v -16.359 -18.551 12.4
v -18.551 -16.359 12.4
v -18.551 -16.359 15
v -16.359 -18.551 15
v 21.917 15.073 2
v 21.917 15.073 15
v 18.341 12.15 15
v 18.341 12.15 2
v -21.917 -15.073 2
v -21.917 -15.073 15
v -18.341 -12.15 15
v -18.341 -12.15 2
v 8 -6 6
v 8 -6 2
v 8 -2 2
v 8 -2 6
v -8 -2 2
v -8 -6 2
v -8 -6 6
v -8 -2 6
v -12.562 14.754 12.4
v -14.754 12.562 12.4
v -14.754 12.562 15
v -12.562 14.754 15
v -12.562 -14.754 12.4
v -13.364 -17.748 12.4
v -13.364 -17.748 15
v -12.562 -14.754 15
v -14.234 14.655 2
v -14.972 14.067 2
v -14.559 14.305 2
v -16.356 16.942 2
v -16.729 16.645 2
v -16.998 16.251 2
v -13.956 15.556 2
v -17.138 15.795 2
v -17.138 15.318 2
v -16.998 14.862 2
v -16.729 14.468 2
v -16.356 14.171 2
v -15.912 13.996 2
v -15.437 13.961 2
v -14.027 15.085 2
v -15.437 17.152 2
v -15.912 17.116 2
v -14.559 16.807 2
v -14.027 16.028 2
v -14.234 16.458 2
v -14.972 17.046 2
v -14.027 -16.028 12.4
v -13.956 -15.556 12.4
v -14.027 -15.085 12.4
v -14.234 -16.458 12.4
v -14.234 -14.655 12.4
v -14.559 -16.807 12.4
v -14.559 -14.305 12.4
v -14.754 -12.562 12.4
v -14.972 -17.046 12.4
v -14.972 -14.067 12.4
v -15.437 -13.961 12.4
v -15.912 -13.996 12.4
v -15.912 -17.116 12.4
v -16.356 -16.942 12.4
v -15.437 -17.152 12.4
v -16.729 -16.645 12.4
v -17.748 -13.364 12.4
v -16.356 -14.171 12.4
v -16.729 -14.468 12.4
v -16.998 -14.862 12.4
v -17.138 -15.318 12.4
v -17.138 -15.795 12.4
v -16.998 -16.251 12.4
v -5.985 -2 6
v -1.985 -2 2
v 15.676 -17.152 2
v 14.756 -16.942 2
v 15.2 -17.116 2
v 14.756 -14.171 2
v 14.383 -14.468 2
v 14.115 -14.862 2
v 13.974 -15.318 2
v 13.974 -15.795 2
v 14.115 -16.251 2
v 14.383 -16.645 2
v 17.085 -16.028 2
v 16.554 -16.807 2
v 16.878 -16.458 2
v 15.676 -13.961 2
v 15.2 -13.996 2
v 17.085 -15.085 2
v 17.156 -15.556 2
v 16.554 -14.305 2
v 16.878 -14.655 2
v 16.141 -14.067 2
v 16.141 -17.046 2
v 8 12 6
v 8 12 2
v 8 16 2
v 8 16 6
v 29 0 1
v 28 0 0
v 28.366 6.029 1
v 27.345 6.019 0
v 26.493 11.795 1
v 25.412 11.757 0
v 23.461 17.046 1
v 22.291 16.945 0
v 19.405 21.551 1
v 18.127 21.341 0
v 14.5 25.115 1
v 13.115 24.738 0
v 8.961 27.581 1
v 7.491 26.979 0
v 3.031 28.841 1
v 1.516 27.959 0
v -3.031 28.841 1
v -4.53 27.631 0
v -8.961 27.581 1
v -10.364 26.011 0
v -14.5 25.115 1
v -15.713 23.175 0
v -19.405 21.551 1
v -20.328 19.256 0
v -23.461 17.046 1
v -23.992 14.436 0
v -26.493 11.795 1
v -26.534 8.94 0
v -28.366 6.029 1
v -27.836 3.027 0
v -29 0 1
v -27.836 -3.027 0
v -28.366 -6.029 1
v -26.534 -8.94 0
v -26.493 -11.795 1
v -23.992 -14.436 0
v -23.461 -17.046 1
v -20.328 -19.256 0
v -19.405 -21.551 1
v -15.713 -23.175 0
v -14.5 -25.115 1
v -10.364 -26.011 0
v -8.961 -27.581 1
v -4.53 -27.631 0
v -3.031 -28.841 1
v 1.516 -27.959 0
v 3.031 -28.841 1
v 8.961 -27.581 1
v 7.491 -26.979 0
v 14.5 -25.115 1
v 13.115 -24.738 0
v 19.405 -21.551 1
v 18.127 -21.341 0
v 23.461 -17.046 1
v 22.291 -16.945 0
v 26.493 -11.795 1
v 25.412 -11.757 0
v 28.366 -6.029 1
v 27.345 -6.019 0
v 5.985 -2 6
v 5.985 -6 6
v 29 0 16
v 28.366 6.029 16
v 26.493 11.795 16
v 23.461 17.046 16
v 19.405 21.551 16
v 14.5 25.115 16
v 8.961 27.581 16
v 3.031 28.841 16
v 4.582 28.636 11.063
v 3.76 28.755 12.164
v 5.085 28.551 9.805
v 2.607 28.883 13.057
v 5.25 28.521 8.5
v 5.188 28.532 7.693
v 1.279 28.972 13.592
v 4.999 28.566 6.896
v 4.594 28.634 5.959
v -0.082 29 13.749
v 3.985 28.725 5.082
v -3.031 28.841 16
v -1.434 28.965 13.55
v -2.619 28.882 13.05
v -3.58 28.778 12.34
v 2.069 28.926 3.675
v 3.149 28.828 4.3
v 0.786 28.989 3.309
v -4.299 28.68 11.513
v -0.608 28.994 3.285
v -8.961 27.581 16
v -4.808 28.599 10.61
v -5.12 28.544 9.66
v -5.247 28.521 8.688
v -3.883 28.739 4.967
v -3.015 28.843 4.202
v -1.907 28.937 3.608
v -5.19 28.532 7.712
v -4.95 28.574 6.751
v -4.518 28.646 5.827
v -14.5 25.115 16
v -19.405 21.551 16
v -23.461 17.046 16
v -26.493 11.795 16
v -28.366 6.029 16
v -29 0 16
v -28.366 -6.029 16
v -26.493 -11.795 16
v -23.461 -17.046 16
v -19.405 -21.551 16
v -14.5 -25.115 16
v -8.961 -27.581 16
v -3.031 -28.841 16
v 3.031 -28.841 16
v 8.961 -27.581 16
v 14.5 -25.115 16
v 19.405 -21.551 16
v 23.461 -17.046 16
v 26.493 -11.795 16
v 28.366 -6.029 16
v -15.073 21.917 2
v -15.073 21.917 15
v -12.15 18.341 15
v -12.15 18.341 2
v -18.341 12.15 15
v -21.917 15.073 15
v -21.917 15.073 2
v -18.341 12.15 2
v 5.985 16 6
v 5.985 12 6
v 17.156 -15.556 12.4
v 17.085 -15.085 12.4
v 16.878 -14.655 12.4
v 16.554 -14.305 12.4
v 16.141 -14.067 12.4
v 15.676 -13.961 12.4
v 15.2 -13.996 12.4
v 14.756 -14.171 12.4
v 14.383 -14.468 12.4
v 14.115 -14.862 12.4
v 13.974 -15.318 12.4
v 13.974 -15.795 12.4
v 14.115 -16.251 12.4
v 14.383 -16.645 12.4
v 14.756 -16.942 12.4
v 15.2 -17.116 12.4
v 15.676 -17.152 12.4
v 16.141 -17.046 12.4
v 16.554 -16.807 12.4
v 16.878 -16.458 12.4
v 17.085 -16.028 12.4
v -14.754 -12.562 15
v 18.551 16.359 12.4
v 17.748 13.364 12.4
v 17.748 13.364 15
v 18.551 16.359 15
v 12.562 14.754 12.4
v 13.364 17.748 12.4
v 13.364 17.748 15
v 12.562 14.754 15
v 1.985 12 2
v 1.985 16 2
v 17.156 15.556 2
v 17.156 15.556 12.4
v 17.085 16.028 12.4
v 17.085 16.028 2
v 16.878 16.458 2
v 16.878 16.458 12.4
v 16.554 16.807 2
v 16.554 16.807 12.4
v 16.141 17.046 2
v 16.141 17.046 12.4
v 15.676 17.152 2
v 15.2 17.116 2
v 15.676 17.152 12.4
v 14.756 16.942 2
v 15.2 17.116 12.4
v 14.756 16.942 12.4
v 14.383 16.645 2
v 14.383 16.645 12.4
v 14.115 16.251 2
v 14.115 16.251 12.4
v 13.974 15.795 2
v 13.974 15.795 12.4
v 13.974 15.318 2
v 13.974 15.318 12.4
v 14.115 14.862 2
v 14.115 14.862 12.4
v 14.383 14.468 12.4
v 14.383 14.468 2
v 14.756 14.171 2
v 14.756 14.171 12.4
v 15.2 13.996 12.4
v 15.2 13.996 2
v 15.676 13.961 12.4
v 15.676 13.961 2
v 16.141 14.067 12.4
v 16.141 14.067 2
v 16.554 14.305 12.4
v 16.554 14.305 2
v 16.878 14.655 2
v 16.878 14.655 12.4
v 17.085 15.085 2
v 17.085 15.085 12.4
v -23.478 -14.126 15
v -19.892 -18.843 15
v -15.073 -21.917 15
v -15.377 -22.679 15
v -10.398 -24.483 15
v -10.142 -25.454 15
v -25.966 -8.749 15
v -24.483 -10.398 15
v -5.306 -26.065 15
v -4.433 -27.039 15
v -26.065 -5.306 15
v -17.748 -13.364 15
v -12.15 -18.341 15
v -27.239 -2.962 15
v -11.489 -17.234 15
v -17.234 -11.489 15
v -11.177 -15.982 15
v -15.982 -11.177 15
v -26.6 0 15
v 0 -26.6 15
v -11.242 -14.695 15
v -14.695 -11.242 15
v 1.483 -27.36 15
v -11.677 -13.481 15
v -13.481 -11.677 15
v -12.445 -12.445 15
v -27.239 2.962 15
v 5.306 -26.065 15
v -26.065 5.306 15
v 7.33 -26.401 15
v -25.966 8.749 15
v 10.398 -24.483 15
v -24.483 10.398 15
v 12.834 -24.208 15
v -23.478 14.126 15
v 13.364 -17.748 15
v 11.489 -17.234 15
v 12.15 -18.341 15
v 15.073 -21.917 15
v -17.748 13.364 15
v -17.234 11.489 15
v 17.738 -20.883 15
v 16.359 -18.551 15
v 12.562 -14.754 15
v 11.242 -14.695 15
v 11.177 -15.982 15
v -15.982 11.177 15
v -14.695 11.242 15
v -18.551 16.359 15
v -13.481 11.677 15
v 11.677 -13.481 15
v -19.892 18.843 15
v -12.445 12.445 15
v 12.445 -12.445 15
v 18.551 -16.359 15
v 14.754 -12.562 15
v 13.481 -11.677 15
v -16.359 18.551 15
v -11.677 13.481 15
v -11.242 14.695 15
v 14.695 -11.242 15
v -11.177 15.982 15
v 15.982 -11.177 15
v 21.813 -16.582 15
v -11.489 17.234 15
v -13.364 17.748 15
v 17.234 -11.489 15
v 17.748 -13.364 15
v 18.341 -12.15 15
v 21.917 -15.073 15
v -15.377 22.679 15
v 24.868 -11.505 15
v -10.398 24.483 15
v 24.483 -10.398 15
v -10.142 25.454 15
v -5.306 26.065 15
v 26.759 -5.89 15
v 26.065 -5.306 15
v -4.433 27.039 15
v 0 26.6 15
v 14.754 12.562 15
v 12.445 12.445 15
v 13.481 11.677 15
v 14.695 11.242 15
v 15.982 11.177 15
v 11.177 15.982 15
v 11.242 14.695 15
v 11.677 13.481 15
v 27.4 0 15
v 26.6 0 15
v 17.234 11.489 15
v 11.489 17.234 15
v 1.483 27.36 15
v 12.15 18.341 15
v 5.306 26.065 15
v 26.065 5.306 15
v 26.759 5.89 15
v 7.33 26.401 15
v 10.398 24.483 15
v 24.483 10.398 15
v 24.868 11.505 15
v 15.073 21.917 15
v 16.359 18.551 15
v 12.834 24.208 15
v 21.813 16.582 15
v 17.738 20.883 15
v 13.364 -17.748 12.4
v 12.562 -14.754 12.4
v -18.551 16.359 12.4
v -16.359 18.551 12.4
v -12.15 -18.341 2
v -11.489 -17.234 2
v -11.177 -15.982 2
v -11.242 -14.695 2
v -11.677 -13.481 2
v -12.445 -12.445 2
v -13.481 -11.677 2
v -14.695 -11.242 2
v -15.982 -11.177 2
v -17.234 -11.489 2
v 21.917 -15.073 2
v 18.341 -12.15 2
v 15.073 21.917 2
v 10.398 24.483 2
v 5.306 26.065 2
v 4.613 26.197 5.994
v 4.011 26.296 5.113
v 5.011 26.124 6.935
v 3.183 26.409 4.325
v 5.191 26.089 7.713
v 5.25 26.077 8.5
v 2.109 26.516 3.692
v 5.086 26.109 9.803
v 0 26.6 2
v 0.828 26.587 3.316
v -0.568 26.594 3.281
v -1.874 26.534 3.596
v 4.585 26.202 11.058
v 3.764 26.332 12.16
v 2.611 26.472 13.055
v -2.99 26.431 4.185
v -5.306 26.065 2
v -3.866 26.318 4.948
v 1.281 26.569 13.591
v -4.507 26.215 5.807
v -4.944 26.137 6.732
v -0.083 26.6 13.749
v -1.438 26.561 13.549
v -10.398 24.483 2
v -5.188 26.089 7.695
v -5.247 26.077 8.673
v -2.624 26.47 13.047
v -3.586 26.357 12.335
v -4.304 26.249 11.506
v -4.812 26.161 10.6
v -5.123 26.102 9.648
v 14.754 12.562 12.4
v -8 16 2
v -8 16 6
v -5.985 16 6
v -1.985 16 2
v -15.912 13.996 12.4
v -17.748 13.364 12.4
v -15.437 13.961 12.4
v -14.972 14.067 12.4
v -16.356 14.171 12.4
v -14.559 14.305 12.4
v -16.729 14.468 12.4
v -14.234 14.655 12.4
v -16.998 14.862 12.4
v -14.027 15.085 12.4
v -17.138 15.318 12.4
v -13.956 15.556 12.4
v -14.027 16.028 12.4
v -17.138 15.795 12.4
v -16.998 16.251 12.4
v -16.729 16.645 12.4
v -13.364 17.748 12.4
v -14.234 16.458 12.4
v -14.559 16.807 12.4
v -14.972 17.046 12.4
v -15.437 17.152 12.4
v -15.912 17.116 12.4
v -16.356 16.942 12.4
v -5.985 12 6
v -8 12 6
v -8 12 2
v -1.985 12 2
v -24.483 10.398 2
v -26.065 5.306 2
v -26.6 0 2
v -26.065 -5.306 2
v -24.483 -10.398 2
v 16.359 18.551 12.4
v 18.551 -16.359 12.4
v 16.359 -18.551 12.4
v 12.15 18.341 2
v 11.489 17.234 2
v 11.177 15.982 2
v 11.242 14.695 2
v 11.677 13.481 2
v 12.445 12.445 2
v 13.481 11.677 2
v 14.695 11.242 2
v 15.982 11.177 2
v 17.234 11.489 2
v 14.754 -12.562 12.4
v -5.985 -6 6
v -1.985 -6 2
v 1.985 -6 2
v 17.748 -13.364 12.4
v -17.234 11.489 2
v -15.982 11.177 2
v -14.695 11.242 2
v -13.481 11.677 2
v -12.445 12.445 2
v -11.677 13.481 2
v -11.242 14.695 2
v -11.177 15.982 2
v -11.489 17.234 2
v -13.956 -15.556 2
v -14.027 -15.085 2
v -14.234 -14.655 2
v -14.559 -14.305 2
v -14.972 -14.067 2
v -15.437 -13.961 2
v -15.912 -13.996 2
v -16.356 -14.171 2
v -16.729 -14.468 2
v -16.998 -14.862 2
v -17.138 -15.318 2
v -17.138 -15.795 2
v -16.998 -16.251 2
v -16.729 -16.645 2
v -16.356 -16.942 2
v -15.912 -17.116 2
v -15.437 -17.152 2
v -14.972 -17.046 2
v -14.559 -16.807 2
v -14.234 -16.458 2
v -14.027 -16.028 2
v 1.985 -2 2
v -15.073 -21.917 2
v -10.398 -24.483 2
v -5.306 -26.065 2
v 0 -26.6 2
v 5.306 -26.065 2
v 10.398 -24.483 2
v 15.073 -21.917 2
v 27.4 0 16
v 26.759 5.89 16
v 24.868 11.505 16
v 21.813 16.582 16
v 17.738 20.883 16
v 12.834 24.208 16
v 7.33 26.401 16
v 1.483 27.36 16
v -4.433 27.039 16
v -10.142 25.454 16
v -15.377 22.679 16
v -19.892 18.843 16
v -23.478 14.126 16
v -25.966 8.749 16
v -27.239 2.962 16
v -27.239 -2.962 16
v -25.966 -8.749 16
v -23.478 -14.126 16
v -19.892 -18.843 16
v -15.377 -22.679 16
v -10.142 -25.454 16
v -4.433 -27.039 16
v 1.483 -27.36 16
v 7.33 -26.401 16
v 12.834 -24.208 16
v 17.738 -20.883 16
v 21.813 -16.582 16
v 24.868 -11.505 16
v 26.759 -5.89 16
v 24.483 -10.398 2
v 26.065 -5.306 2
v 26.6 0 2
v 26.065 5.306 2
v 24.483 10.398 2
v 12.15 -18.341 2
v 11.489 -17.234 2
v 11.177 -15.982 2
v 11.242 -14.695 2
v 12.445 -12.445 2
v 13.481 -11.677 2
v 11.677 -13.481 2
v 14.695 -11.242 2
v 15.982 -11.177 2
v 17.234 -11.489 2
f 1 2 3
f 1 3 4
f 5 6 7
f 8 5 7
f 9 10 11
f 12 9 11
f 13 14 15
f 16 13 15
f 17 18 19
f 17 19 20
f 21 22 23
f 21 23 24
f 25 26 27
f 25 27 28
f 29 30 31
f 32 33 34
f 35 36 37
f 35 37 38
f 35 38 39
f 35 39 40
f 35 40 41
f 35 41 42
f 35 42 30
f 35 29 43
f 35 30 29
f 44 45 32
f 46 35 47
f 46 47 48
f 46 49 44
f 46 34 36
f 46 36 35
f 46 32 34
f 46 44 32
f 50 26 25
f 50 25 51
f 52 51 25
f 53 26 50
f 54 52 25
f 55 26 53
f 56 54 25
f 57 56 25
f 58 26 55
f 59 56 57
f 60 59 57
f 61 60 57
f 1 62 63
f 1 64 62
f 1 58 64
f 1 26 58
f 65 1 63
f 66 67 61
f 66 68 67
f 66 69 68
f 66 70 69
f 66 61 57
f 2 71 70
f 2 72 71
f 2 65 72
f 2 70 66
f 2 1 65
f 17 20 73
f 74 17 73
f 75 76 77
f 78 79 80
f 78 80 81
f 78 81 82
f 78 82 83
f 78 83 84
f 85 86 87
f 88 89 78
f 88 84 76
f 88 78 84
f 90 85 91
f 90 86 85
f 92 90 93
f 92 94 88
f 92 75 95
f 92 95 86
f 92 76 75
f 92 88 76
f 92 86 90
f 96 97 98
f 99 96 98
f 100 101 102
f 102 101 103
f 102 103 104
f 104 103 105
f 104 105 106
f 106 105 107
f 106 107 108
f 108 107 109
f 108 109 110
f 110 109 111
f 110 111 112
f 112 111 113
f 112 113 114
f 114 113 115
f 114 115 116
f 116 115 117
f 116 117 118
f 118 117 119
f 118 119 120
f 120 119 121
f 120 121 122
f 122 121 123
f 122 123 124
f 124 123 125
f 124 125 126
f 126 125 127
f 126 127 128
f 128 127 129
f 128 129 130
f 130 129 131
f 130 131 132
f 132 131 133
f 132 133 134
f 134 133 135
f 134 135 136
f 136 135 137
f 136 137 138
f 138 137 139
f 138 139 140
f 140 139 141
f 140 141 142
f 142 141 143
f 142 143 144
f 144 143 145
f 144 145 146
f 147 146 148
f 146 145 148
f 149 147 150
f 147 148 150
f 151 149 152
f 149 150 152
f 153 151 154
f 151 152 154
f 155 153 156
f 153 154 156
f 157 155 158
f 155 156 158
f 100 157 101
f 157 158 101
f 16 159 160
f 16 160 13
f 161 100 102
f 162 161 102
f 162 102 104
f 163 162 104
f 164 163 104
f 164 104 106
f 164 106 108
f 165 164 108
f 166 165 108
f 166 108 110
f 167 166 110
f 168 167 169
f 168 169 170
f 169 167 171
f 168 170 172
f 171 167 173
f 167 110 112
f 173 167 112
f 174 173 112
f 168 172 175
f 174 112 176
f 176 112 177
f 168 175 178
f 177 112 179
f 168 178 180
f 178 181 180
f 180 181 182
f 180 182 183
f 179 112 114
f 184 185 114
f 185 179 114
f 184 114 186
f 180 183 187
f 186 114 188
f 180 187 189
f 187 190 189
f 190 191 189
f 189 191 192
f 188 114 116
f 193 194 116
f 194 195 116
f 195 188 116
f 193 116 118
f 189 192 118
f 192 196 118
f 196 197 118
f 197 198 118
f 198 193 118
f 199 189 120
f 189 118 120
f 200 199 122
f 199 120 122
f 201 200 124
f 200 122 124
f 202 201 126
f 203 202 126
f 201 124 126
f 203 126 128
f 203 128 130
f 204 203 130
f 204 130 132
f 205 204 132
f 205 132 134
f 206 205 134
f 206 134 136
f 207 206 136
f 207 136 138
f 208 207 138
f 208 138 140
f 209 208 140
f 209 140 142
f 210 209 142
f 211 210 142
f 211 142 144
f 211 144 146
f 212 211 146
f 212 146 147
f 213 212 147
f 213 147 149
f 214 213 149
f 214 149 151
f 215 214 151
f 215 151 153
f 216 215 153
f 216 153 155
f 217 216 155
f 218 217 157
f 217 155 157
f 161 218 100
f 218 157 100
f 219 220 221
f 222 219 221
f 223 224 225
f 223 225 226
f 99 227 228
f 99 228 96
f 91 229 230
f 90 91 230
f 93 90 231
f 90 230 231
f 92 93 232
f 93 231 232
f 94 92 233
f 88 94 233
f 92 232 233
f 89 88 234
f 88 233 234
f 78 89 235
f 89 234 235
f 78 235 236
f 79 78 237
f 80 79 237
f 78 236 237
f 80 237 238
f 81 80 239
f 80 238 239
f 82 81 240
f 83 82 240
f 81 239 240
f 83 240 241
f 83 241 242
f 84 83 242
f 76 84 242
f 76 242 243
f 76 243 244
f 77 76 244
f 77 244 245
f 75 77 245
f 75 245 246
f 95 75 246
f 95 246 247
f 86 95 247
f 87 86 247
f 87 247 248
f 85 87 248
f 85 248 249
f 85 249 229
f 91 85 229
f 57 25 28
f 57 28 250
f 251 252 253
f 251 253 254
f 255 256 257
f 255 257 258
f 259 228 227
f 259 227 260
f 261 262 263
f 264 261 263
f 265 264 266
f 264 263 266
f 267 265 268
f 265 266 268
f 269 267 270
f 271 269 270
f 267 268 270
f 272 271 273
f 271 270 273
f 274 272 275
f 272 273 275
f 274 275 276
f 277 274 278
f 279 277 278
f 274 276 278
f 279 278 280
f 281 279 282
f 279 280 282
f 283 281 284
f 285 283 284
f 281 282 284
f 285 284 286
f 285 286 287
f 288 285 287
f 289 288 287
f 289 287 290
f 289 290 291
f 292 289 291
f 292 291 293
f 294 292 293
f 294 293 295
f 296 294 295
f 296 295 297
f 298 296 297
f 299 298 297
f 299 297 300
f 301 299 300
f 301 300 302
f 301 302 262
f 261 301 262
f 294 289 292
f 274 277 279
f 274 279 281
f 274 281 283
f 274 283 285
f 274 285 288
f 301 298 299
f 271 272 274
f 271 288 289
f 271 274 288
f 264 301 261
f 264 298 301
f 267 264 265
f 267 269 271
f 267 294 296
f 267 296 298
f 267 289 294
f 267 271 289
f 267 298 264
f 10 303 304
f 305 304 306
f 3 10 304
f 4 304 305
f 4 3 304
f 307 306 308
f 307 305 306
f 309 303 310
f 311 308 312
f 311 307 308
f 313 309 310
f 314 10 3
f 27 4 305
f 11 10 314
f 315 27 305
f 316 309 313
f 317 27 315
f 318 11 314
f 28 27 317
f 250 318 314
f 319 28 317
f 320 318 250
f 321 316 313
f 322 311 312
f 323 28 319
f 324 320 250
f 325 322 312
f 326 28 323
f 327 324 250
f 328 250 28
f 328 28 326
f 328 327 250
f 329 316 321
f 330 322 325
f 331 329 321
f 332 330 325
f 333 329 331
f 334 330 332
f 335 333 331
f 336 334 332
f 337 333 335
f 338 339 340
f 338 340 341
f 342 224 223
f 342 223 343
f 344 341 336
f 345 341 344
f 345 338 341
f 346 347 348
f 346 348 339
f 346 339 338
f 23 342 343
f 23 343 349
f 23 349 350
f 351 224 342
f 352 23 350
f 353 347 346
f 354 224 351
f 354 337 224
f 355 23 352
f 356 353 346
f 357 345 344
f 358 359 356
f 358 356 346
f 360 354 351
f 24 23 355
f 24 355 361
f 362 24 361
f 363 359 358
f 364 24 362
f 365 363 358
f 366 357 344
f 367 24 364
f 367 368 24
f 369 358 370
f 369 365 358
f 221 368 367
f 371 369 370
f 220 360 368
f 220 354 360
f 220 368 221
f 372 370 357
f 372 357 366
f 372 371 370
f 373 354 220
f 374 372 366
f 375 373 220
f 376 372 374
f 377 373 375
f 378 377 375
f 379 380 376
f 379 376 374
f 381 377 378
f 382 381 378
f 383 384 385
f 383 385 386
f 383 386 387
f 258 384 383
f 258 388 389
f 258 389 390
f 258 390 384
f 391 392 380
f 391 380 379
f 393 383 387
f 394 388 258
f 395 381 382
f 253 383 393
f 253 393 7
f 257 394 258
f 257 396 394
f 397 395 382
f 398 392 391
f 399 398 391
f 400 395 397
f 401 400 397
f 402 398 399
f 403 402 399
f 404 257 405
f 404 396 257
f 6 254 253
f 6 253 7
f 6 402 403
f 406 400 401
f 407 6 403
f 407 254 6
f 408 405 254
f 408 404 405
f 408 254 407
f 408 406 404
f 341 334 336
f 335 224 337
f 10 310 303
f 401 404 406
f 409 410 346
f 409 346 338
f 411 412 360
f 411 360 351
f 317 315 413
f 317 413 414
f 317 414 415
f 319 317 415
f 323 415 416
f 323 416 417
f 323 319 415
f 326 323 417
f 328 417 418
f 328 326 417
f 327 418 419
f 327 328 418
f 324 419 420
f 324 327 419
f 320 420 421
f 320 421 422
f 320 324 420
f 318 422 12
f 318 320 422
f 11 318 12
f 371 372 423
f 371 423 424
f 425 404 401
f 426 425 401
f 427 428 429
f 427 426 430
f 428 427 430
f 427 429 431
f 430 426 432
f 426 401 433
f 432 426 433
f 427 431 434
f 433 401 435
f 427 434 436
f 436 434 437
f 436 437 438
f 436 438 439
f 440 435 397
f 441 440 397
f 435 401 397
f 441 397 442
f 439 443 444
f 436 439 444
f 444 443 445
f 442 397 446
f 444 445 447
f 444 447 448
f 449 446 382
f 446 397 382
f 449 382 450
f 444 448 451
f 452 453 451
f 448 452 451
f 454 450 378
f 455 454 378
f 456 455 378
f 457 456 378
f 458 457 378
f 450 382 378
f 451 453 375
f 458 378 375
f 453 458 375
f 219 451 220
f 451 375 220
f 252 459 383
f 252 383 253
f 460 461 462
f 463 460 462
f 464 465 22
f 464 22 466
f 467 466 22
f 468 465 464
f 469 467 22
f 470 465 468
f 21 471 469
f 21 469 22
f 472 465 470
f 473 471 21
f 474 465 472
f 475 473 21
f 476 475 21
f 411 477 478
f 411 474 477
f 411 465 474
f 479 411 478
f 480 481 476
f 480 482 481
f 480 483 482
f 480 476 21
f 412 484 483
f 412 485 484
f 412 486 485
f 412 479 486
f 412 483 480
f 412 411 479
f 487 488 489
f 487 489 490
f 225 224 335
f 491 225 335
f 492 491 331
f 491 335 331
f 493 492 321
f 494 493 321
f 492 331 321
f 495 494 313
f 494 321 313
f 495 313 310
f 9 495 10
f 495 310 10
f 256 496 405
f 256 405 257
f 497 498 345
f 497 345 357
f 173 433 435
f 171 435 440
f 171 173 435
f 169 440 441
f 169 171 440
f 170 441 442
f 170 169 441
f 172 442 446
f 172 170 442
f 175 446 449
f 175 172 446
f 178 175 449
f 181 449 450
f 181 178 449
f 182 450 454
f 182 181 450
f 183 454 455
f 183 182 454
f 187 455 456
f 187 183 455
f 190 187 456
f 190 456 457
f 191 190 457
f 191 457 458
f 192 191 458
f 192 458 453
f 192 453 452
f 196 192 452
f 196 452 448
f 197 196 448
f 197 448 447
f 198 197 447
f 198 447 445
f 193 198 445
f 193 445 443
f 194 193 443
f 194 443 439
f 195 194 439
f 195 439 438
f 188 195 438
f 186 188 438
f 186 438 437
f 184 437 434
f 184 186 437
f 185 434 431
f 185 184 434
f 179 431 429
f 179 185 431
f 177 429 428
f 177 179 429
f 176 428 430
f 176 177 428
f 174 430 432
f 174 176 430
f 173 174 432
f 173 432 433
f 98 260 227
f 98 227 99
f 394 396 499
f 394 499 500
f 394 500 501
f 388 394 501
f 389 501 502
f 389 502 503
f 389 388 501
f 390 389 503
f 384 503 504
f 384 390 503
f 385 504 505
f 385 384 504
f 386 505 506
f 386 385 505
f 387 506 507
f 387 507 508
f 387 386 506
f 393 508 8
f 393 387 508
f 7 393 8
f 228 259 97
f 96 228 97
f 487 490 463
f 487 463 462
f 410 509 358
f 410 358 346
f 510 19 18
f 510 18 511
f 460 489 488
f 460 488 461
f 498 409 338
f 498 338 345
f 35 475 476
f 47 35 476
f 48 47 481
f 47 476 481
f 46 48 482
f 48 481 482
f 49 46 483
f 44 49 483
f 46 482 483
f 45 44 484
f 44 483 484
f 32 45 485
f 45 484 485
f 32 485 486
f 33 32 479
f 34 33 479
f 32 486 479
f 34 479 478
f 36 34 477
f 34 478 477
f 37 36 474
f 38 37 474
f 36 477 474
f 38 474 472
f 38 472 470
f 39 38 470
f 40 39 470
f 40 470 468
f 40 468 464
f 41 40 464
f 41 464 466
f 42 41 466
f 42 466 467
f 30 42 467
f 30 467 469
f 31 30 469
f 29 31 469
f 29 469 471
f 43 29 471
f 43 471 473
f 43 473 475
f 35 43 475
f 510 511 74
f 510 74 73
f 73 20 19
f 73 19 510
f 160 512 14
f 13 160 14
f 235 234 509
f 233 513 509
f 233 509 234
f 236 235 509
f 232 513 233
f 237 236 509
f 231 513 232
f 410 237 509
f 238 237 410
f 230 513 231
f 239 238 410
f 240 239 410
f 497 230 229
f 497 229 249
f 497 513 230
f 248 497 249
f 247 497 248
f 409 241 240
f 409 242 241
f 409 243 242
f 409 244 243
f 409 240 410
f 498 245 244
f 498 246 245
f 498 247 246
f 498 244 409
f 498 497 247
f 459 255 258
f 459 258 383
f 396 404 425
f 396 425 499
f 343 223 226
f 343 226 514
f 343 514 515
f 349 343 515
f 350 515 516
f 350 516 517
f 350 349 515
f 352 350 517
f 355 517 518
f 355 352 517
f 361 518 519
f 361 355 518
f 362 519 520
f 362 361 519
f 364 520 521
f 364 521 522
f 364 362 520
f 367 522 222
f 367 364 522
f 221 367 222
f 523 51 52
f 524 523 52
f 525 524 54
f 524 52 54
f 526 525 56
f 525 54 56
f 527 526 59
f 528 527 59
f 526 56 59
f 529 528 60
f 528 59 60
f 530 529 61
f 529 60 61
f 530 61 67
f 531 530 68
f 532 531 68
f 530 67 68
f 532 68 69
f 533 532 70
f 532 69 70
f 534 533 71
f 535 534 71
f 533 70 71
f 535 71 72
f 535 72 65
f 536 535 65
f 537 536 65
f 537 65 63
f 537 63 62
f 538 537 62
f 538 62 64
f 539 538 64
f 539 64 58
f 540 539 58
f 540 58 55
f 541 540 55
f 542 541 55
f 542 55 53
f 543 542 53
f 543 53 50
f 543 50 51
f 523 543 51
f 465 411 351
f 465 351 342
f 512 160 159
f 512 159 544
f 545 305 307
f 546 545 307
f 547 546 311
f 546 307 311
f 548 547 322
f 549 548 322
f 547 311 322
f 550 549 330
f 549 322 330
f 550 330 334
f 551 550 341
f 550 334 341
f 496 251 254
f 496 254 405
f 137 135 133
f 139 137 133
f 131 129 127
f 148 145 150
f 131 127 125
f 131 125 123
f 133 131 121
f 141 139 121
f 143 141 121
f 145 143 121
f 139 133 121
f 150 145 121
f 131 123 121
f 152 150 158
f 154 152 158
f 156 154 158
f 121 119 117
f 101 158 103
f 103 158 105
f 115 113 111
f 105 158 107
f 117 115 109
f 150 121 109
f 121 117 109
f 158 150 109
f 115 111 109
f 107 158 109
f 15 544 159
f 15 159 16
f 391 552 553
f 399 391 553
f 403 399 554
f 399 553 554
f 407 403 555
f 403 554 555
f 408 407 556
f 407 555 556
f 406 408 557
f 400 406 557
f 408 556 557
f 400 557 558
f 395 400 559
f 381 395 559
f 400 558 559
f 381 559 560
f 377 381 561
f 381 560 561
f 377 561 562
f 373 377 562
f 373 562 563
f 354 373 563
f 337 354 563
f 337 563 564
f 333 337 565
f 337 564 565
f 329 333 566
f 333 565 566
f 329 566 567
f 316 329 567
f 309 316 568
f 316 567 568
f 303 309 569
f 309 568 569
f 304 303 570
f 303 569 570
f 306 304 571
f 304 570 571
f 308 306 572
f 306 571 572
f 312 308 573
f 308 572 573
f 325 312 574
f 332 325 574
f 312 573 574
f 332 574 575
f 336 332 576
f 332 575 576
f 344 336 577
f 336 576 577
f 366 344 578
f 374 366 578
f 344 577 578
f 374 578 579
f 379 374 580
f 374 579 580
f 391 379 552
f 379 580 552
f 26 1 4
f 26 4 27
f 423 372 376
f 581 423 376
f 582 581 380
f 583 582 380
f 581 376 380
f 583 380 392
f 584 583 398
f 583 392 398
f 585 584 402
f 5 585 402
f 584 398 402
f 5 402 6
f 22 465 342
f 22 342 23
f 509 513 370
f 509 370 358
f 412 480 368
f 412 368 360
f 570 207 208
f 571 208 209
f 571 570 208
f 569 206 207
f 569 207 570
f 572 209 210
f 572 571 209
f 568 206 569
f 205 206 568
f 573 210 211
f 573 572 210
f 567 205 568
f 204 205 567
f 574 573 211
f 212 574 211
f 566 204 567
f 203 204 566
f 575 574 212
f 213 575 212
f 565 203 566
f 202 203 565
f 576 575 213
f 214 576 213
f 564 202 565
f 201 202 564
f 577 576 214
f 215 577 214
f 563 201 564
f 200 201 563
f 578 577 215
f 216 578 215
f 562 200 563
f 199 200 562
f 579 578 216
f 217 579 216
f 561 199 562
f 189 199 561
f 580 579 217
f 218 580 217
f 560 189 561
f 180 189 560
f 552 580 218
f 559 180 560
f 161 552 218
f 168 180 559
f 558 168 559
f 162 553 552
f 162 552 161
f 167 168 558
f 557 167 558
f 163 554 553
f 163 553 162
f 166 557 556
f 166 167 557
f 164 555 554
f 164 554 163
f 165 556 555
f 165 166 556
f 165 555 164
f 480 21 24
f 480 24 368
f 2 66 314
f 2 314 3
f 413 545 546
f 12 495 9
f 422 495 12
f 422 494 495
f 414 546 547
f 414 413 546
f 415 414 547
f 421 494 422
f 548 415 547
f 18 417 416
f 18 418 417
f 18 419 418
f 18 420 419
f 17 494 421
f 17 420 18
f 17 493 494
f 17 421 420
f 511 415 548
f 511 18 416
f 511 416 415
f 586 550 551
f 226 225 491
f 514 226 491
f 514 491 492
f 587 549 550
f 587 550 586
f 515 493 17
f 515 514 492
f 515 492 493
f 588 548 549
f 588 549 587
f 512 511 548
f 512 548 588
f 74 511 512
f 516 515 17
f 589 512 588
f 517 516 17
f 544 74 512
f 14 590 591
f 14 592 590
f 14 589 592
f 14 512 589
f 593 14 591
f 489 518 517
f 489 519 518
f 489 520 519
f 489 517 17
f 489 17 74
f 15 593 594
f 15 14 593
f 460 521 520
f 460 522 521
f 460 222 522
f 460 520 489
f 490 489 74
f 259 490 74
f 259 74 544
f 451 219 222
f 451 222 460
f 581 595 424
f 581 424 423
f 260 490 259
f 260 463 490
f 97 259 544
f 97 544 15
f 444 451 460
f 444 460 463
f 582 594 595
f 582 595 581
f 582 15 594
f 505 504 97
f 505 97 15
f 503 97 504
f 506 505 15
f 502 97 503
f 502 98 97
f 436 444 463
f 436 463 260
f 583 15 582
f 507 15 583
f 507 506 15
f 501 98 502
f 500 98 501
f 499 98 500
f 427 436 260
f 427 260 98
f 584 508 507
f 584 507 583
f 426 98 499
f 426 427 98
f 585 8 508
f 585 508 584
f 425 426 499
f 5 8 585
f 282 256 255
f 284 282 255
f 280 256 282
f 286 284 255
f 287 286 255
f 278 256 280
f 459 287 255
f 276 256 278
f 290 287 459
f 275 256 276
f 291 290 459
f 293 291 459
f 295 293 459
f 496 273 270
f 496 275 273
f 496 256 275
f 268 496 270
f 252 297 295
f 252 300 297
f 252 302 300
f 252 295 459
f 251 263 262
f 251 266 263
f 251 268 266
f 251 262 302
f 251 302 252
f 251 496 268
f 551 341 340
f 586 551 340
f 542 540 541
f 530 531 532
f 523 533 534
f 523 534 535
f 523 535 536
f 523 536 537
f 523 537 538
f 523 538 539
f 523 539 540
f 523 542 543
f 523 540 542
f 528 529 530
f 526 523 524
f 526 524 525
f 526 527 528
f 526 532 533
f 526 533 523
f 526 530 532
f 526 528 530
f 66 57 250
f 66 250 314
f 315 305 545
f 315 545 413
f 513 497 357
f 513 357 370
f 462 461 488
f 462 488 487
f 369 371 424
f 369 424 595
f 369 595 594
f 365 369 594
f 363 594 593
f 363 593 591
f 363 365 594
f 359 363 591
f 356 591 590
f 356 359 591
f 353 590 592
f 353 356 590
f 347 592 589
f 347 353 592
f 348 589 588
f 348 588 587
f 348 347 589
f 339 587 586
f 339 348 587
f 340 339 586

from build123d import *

# Parameters (mm, degrees)
PRISM002_DEPTH           = 2.6
PRISM002_PLACEMENT_ANGLE = 45
ARRAY_COUNT              = 4
CYLINDER003_R            = 5.25
CYLINDER003_DEPTH        = 36
CYLINDER003_ROLL_ANGLE   = 90
SKETCH011_R              = 29
PAD006_DEPTH             = 16
SKETCH_R                 = 27.4
POCKET_DEPTH             = 1
SKETCH012_R              = 1.6
POCKET003_DEPTH          = 13
SKETCH013_W              = 16
SKETCH013_H              = 4
PAD_DEPTH                = 4
POCKET004_DEPTH          = 24
CHAMFER_SIZE             = 1


with BuildPart() as array:
    # Prism002 → Prism002 (new body)
    with BuildSketch(Plane.XY):
        Polygon((3.1, 0), (1.55, 2.684679), (-1.55, 2.684679), (-3.1, 0), (-1.55, -2.684679), (1.55, -2.684679), align=None)
    extrude(amount=PRISM002_DEPTH)


with BuildPart() as array_1:
    # Prism002 placement: moved
    add(array.part.moved(Location((-15.5563, 15.5563, 12.4))).rotate(Axis((-15.5563, 15.5563, 12.4), (0, 0, 1)), PRISM002_PLACEMENT_ANGLE))

    # Array: Array ×4 about axis
    array_axis = Axis((0, 0, 0), (0, 0, 1))


with BuildPart() as array_2:
    add(array_1.part)
    for i in range(1, ARRAY_COUNT):
        add(array_1.part.rotate(array_axis, i * 360 / ARRAY_COUNT))


with BuildPart() as laser_pointer:
    # Cylinder003 → Cylinder003 (new body)
    with BuildSketch(Plane.XY):
        Circle(CYLINDER003_R)
    extrude(amount=CYLINDER003_DEPTH)


with BuildPart() as laser_pointer_1:
    # Cylinder003 roll: moved
    add(laser_pointer.part.rotate(Axis((0, 0, 0), (1, 0, 0)), CYLINDER003_ROLL_ANGLE))


with BuildPart() as laser_pointer_2:
    # Cylinder003 placement: moved
    add(laser_pointer_1.part.moved(Location((0, 30, 8.5))))


with BuildPart() as laser_enclosure:
    # Sketch011 → Pad006 (new body)
    with BuildSketch(Plane.XY):
        Circle(SKETCH011_R)
    extrude(amount=PAD006_DEPTH)

    # Sketch → Pocket (cut)
    with BuildSketch(Plane.XY.offset(16)):
        Circle(SKETCH_R)
    extrude(amount=-POCKET_DEPTH, mode=Mode.SUBTRACT)

    # Sketch012 → Pocket003 (cut)
    with BuildSketch(Plane.XY.offset(15)):
        with Locations((-15.556349, 15.556349)):
            Circle(SKETCH012_R)
        with Locations((-15.556349, -15.556349)):
            Circle(SKETCH012_R)
        with Locations((15.556349, -15.556349)):
            Circle(SKETCH012_R)
        with Locations((15.556349, 15.556349)):
            Circle(SKETCH012_R)
        with BuildLine():
            ThreePointArc((-15.072779, -21.917375), (0, -26.6), (15.072779, -21.917375))
            Line((15.072779, -21.917375), (12.149548, -18.340897))
            ThreePointArc((18.340897, -12.149548), (12.445079, -12.445079), (12.149548, -18.340897))
            Line((21.91738, -15.072773), (18.340897, -12.149548))
            ThreePointArc((21.91738, -15.072773), (26.6, 4e-06), (21.917375, 15.072779))
            Line((21.917375, 15.072779), (18.340897, 12.149548))
            ThreePointArc((12.149548, 18.340897), (12.445079, 12.445079), (18.340897, 12.149548))
            Line((15.072779, 21.917375), (12.149548, 18.340897))
            ThreePointArc((15.072779, 21.917375), (0, 26.6), (-15.072779, 21.917375))
            Line((-15.072779, 21.917375), (-12.149548, 18.340897))
            ThreePointArc((-18.340897, 12.149548), (-12.445079, 12.445079), (-12.149548, 18.340897))
            Line((-21.917375, 15.072779), (-18.340897, 12.149548))
            ThreePointArc((-21.917375, 15.072779), (-26.6, 0), (-21.917375, -15.072779))
            Line((-21.917375, -15.072779), (-18.340897, -12.149548))
            ThreePointArc((-12.149548, -18.340897), (-12.445079, -12.445079), (-18.340897, -12.149548))
            Line((-15.072779, -21.917375), (-12.149548, -18.340897))
        make_face()
    extrude(amount=-POCKET003_DEPTH, mode=Mode.SUBTRACT)

    # Sketch013 → Pad (new body)
    with BuildSketch(Plane.XY.offset(2)):
        with Locations((0, 14)):
            Rectangle(SKETCH013_W, SKETCH013_H)
        with Locations((0, -4)):
            Rectangle(SKETCH013_W, SKETCH013_H)
    extrude(amount=PAD_DEPTH)

    # Sketch014 → Pocket004 (cut)
    with BuildSketch(Plane.XZ.offset(6)):
        Polygon((5.985281, 6), (1.985281, 2), (-1.985281, 2), (-5.985281, 6), align=None)
    extrude(amount=-POCKET004_DEPTH, mode=Mode.SUBTRACT)

    # Cut: cut Laser pointer
    add(laser_pointer_2.part, mode=Mode.SUBTRACT)

    # Cut001: cut Array
    add(array_2.part, mode=Mode.SUBTRACT)

    # Chamfer
    chamfer_edges = [laser_enclosure.edges().sort_by_distance(p)[0] for p in [
        (-29, 0, 0),
    ]]
    chamfer(chamfer_edges, length=CHAMFER_SIZE)


solid = laser_enclosure.part
